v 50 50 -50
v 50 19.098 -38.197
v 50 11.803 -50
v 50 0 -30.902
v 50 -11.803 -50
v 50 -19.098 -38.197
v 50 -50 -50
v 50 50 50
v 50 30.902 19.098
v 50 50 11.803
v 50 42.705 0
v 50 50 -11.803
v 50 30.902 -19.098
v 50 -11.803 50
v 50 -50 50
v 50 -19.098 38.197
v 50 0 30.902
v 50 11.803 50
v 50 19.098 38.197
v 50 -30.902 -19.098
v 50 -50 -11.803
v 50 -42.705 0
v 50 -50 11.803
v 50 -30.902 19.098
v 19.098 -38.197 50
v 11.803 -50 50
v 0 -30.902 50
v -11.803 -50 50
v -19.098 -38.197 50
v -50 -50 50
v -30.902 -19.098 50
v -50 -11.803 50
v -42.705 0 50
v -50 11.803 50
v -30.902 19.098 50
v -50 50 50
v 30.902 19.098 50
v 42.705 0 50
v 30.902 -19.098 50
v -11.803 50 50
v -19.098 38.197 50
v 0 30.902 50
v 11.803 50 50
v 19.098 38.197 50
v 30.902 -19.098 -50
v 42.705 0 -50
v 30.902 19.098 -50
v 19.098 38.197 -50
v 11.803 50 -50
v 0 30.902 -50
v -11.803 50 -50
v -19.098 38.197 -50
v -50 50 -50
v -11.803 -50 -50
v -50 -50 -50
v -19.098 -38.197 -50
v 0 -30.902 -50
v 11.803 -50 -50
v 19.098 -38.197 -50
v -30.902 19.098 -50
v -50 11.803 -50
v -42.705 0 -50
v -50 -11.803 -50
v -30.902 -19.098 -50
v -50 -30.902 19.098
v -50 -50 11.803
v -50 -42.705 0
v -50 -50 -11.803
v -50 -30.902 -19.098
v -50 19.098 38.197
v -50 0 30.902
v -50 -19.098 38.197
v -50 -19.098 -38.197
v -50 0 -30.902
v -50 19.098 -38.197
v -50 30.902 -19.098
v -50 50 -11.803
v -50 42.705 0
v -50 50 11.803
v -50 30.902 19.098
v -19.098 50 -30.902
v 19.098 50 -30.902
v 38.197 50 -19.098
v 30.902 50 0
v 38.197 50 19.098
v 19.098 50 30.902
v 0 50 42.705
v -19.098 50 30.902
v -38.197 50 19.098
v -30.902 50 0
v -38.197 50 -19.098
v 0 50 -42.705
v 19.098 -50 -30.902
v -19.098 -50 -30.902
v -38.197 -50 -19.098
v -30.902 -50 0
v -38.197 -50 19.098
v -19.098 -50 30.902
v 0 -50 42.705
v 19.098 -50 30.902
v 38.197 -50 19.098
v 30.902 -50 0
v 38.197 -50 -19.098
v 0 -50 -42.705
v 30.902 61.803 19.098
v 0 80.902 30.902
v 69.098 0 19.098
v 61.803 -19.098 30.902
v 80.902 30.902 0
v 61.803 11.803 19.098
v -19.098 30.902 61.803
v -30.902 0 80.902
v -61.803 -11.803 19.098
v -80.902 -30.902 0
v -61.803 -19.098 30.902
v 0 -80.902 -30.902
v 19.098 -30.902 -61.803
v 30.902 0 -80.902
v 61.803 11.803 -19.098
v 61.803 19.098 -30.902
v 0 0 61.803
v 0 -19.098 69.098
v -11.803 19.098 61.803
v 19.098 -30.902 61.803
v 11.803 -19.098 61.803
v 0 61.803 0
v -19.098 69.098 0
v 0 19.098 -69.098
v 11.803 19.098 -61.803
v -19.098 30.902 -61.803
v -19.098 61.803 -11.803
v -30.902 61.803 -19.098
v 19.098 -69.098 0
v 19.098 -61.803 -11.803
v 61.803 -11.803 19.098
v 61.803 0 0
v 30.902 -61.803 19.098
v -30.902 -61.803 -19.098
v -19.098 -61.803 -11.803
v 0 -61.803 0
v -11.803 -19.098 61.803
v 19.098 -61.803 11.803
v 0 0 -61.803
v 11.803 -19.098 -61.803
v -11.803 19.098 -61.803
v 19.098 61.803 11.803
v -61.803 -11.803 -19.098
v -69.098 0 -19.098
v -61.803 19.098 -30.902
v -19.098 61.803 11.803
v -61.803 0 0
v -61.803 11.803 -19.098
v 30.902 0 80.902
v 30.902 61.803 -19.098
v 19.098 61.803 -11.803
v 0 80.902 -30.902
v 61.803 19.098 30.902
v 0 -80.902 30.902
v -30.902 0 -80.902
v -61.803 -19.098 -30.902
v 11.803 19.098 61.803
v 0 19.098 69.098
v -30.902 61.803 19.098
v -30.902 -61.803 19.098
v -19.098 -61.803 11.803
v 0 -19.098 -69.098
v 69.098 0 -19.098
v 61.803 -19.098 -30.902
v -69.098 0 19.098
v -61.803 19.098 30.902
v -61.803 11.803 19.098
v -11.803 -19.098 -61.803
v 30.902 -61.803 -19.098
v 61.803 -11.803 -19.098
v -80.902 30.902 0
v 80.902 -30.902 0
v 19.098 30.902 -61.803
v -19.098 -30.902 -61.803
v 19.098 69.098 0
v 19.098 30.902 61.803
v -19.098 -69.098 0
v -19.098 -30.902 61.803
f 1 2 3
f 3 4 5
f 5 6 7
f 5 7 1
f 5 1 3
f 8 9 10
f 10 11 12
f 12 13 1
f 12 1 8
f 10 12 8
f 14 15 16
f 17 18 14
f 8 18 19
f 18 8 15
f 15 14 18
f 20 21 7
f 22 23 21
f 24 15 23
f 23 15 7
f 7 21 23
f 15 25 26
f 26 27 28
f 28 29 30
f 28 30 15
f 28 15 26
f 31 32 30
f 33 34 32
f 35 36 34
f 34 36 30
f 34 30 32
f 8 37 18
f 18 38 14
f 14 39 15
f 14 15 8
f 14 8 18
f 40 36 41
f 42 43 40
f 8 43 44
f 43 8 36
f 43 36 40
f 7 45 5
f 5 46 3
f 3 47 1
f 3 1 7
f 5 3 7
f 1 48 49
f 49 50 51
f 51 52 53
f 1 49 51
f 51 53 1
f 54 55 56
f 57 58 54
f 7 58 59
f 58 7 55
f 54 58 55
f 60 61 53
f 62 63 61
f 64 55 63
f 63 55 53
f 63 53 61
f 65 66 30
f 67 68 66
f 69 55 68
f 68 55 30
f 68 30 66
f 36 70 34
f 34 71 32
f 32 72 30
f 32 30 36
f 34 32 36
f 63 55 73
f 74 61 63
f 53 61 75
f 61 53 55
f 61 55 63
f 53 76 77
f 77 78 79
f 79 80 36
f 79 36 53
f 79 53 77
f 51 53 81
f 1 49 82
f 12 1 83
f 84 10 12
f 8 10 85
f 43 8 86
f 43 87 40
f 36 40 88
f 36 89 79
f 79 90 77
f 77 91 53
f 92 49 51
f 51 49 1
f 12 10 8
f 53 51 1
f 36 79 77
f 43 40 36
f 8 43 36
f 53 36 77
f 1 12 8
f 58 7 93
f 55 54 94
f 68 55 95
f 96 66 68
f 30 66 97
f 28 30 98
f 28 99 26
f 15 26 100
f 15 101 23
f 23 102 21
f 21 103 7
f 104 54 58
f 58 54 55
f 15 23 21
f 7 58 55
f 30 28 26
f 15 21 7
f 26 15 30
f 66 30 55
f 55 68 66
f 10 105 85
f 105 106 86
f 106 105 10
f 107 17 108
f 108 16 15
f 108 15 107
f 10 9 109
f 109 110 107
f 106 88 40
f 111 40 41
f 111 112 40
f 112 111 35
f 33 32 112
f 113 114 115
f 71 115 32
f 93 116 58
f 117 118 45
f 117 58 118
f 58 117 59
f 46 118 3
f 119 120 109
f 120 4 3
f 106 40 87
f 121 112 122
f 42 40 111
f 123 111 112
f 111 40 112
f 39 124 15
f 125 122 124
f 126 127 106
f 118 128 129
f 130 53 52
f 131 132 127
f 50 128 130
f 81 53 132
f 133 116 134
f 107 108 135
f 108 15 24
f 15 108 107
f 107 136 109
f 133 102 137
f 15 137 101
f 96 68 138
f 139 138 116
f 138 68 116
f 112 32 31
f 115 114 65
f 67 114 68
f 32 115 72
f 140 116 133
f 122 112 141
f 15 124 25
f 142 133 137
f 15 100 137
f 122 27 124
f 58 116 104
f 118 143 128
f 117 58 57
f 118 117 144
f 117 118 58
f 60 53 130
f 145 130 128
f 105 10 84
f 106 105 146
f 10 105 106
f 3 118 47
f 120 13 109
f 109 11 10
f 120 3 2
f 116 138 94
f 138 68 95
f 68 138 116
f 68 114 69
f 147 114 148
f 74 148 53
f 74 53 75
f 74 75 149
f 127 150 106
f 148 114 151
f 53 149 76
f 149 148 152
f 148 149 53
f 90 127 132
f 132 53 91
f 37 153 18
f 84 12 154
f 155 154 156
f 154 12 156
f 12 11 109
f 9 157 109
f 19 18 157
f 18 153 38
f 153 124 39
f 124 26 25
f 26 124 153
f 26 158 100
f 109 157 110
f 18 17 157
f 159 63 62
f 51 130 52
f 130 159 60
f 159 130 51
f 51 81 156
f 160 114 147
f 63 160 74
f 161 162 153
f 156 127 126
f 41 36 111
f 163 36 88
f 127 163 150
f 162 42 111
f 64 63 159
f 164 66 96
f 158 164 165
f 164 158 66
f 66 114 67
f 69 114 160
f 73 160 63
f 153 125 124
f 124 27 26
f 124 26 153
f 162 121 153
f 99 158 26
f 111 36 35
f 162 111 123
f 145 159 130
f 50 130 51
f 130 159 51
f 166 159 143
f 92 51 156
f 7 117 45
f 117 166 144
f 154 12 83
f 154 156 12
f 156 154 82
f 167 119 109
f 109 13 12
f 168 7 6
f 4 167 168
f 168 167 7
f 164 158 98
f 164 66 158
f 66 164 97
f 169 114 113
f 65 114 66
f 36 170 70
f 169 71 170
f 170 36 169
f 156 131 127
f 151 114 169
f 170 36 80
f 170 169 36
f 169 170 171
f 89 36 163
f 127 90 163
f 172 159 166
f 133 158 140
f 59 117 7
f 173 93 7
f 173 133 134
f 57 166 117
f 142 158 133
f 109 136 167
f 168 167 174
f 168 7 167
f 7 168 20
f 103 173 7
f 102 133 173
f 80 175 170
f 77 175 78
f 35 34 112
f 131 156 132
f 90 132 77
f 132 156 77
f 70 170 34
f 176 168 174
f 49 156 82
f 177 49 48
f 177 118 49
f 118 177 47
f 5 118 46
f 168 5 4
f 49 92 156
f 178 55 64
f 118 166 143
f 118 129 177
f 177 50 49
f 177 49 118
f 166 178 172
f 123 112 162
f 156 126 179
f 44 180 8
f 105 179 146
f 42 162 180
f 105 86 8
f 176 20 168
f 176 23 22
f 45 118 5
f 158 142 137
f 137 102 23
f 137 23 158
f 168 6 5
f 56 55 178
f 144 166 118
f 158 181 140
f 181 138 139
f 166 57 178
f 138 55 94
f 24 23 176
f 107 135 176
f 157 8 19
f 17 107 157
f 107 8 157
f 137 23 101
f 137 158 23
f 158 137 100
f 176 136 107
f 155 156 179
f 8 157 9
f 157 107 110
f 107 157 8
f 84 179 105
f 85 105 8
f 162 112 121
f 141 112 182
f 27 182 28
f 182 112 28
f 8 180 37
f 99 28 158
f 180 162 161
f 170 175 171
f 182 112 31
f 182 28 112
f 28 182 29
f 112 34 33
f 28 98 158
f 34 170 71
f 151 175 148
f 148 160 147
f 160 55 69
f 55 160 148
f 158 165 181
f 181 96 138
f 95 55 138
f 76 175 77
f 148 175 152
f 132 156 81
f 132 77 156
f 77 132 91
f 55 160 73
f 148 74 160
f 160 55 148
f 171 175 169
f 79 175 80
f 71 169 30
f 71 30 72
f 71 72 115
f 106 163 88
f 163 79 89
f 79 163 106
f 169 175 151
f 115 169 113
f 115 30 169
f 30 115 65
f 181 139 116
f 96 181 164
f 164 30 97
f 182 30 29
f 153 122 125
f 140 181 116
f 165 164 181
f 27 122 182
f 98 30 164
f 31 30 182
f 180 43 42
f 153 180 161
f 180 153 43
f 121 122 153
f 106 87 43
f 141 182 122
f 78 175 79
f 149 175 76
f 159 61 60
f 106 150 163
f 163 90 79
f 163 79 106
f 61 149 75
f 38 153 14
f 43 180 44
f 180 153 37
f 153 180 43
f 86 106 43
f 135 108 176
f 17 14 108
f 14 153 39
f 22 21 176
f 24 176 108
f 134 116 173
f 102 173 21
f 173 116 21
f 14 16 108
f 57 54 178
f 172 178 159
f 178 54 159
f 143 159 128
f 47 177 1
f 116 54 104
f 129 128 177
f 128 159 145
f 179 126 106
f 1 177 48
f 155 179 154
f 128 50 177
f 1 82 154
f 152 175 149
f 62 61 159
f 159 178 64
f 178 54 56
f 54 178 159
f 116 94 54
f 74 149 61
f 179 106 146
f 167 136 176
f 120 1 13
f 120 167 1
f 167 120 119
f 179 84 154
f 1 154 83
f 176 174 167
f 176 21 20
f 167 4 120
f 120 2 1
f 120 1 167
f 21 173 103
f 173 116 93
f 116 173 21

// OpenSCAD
// Composto de cinco cubos

/*
  O solido gerado serah a uniao de 5 cubos, formando uma figura cuja envoltoria
  convexa eh um dodecaedro.

  Cada cubo eh gerado pela rotacao de um cubo basico, com um angulo multiplo de
  72 graus, em torno de um eixo definido por um certo vetor (o vetor aponta para
  uma das 12 faces do dodecaedro formado pela figura). Cada uma das 12 x 5 = 60
  arestas dos 5 cubos eh uma diagonal de uma face do dodecaedro. Para cada face,
  as diagonais formam uma estrela de 5 pontas.
*/

// Definindo o angulo fundamental de rotacao
angulo = 72;

// Definindo um tamanho para o cubo basico
tamanho_cubo = 100;

// Definindo a lista de cores dos 5 cubos
cores = ["yellow", "red", "blue", "green", "magenta"];

// Definindo o numero aureo
aureo = (1 + sqrt(5))/2;

// Definindo o vetor que serah o eixo de rotacao para o cubo basico
eixo_de_rotacao = [0, (2 + aureo)/5, (1 + 3*aureo)/5];

union() {
    color(cores[0]) {
        cube(tamanho_cubo,center=true);
    }

    color(cores[1]) {
        rotate(angulo,eixo_de_rotacao) {
            cube(tamanho_cubo,center=true);
        }
    }

    color(cores[2]) {
        rotate(2*angulo,eixo_de_rotacao) {
            cube(tamanho_cubo,center=true);
        }
    }

    color(cores[3]) {
        rotate(3*angulo,eixo_de_rotacao) {
            cube(tamanho_cubo,center=true);
        }
    }

    color(cores[4]) {
        rotate(4*angulo,eixo_de_rotacao) {
            cube(tamanho_cubo,center=true);
        }
    }
}
